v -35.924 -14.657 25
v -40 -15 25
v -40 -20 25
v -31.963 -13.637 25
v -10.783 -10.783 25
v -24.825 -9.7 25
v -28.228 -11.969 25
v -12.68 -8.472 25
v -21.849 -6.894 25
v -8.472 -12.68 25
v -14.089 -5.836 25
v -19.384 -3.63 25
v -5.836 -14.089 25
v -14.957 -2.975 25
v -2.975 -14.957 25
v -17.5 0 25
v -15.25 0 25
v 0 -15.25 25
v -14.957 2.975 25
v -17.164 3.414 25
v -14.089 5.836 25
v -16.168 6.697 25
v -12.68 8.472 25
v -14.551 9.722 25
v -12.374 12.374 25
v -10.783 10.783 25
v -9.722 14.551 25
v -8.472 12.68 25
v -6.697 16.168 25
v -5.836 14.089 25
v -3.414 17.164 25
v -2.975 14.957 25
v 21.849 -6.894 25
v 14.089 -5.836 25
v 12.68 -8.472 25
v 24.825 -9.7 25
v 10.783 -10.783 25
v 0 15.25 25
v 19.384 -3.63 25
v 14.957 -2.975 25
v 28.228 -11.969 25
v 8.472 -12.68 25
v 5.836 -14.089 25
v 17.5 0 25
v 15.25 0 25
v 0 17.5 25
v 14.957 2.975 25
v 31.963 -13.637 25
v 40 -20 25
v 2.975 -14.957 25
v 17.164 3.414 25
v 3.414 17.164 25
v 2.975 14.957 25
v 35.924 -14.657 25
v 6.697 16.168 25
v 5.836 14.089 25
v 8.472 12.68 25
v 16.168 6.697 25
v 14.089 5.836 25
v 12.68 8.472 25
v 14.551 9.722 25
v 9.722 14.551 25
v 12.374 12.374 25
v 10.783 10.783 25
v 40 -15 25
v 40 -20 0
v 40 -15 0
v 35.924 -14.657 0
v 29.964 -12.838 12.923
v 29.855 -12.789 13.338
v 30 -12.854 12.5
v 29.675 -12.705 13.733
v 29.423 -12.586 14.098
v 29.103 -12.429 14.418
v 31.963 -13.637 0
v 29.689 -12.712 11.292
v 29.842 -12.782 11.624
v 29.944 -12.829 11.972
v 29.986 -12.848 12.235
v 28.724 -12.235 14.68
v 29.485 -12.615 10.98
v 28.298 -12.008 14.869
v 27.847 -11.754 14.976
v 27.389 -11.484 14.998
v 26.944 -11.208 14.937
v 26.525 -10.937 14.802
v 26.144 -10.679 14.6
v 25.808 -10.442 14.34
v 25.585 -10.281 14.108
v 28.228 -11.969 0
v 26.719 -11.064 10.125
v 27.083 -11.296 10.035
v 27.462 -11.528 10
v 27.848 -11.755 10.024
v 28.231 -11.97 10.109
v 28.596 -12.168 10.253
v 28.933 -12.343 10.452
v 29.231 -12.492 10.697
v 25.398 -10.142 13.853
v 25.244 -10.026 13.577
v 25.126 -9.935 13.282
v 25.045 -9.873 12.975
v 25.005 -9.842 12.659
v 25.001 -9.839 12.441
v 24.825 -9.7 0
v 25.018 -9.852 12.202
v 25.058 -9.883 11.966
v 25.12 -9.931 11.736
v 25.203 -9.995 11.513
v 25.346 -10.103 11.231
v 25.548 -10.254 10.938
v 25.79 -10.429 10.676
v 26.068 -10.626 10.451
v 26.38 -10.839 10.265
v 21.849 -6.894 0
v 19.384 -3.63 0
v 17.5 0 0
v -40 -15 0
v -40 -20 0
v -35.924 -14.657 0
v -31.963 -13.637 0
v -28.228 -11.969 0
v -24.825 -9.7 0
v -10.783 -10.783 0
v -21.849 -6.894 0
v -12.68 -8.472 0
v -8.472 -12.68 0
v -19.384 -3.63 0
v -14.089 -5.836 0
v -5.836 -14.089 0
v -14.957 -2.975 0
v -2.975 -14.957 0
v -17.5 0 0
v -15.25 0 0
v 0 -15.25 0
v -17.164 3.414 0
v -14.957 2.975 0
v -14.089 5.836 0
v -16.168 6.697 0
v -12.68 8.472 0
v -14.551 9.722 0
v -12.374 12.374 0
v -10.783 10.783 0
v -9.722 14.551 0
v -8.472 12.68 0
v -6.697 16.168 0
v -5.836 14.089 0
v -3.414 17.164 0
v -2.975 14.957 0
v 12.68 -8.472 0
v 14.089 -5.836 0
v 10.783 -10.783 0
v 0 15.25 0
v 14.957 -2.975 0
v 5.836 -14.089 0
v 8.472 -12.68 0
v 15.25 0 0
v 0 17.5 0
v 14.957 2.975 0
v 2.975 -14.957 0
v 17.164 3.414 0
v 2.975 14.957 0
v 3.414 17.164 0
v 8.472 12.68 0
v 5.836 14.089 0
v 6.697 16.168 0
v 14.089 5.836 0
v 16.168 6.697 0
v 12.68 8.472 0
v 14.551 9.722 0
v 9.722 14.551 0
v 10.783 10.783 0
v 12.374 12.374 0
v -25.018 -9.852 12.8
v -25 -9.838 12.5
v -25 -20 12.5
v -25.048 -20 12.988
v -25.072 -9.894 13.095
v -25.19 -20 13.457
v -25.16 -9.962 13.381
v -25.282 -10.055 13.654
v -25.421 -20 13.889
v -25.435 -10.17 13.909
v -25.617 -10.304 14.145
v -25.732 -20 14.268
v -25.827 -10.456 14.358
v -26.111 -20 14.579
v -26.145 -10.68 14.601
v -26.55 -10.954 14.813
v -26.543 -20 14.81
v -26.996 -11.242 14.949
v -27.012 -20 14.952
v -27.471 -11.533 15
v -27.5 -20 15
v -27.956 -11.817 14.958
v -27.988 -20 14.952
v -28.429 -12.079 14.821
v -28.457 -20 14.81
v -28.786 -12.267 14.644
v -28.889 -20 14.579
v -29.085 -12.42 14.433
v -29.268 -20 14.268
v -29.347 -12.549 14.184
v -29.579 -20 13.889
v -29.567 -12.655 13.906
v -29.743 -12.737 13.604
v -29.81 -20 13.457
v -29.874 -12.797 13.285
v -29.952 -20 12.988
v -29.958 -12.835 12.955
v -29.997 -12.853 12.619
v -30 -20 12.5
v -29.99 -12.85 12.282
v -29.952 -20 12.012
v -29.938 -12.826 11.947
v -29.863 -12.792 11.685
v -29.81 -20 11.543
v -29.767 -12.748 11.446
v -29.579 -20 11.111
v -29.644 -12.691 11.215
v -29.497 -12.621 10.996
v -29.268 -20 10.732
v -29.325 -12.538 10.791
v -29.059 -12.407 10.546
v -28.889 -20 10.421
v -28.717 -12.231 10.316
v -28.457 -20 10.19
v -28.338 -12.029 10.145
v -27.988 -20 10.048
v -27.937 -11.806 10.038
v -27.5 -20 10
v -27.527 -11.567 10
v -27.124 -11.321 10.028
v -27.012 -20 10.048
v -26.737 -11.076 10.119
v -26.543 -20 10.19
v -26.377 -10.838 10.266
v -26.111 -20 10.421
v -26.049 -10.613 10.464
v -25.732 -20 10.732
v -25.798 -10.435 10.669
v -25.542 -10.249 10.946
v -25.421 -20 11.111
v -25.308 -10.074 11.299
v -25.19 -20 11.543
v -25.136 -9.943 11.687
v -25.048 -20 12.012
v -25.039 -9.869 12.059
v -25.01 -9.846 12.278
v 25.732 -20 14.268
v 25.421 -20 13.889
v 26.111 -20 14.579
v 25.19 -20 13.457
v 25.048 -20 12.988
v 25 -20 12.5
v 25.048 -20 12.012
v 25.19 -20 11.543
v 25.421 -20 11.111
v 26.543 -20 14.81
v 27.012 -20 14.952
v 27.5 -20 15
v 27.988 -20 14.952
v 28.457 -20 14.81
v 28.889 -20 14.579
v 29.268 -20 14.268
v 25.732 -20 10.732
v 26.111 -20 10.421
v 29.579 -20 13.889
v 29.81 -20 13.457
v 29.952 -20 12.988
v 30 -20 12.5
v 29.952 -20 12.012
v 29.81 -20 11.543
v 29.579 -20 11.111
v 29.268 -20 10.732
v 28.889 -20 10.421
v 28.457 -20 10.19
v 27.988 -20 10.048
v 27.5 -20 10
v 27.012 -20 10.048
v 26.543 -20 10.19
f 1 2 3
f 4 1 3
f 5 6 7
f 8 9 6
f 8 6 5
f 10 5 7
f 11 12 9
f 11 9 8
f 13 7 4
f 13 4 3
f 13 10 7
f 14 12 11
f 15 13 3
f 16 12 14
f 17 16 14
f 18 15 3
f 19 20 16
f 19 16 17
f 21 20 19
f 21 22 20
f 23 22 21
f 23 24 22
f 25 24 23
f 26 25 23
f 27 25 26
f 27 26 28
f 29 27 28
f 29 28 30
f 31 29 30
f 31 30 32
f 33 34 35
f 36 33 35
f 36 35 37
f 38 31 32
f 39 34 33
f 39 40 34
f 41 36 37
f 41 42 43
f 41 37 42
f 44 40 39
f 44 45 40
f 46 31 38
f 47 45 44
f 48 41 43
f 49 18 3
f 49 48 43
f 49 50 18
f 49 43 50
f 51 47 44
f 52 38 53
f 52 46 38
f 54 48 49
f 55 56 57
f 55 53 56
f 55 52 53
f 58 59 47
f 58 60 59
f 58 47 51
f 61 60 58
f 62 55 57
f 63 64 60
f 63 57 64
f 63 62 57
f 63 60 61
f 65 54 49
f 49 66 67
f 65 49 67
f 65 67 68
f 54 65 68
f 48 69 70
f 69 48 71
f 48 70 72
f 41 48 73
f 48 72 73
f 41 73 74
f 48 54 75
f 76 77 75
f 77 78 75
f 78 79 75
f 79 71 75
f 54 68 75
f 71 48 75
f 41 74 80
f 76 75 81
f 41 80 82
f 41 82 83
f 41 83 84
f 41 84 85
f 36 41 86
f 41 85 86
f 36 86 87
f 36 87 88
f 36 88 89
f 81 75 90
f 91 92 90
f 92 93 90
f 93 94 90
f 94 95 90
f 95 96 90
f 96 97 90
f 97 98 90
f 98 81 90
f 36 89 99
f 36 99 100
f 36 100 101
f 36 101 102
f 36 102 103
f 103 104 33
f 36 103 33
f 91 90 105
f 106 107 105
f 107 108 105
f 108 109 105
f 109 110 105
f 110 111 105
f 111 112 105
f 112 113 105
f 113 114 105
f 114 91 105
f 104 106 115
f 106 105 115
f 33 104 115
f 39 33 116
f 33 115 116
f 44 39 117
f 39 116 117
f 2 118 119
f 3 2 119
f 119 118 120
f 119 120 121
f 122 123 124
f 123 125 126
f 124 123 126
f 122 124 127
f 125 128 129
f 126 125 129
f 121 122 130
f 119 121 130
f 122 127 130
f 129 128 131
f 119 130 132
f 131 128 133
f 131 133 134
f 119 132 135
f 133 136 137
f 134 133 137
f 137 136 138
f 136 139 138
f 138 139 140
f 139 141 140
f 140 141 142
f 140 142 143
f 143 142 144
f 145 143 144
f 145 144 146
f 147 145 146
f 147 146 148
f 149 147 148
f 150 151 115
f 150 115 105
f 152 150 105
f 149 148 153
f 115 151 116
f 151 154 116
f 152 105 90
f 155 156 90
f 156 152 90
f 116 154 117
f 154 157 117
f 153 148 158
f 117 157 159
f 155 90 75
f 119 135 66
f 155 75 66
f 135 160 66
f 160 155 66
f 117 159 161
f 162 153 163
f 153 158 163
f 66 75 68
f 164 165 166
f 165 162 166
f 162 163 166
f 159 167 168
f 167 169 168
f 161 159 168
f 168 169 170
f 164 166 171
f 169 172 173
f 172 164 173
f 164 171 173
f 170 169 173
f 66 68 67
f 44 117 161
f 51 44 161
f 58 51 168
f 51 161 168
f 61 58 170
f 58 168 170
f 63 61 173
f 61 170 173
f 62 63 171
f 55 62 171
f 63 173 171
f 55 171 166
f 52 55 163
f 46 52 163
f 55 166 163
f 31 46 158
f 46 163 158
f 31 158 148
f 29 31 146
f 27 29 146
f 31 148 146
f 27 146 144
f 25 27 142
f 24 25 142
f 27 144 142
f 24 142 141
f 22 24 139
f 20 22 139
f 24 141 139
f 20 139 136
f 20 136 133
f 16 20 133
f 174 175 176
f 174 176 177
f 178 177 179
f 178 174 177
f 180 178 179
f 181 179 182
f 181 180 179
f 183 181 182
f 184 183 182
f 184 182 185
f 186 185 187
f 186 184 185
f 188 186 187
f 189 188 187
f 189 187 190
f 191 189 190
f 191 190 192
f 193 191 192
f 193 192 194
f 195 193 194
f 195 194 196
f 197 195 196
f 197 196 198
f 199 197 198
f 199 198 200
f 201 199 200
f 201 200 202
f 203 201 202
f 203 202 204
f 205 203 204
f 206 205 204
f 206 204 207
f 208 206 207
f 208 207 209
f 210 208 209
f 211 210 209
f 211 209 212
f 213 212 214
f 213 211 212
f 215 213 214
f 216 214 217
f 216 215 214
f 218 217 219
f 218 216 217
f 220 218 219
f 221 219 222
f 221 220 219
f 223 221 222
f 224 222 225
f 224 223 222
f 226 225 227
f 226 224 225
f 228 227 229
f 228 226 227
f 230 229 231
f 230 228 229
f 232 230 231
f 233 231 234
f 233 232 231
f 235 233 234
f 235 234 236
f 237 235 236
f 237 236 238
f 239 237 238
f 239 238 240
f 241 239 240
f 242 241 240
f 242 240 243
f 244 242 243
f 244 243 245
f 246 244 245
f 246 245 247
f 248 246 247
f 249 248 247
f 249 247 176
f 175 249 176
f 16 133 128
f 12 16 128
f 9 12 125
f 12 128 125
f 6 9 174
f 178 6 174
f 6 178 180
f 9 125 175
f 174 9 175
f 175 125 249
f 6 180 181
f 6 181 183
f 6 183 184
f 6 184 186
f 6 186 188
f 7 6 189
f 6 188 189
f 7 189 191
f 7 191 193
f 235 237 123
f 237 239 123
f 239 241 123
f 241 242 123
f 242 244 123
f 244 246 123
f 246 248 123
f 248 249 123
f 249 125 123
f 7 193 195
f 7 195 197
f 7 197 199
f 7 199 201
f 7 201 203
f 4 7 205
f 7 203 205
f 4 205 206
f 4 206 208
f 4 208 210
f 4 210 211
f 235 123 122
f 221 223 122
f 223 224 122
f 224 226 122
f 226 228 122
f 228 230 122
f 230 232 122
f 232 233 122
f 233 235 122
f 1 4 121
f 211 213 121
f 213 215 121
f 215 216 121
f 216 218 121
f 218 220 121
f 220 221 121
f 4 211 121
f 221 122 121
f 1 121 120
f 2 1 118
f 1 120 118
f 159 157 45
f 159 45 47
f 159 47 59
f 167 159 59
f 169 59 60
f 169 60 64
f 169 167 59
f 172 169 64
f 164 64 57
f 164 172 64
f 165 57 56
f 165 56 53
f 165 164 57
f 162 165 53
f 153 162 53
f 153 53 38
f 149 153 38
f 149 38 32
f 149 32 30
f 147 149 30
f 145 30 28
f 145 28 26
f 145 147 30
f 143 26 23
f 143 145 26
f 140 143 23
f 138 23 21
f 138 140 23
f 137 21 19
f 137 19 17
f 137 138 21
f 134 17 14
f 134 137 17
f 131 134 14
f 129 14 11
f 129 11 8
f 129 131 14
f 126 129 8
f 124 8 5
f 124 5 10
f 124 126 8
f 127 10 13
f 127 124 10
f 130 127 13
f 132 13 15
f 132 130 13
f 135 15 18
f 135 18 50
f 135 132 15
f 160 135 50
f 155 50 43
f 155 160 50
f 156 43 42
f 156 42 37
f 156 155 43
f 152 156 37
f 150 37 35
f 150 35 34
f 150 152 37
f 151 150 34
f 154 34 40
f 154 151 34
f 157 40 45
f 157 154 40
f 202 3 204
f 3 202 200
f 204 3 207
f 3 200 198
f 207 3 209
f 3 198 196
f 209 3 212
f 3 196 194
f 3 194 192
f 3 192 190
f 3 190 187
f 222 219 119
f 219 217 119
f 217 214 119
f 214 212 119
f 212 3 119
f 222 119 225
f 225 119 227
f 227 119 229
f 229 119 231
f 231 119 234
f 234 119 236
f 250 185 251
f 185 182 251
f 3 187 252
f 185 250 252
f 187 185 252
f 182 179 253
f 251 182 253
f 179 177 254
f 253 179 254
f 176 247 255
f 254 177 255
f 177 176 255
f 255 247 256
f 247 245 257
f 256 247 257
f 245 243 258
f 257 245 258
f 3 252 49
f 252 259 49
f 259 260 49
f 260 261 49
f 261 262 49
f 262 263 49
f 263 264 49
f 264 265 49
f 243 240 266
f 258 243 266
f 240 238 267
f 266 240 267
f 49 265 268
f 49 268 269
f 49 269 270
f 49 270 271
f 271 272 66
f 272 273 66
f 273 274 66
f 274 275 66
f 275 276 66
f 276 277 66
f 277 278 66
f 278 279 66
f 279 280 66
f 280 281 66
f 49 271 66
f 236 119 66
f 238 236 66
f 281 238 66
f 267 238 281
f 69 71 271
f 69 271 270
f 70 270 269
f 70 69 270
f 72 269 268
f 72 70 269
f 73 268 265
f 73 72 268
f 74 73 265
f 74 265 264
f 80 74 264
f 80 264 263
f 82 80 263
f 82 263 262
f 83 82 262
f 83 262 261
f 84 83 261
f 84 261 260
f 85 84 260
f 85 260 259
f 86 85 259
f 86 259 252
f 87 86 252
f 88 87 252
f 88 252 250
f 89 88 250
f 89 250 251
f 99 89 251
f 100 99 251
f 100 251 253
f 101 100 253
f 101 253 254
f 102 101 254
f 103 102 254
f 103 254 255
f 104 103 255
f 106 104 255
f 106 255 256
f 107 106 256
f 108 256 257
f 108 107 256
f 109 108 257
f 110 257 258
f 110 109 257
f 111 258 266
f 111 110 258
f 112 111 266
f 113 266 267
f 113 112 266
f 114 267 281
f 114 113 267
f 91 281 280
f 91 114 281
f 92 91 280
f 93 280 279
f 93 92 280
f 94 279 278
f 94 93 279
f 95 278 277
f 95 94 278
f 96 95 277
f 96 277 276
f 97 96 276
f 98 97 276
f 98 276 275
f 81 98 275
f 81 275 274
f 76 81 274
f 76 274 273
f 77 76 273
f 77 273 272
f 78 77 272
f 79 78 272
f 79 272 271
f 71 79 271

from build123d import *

# Parameters (mm, degrees)
F0_R     = 15.25
F1_DEPTH = 25
F2_R     = 2.5
F3_DEPTH = 25


with BuildPart() as f1:
    # F0 (on Top) → F1 (new body)
    with BuildSketch(Plane.XY):
        with BuildLine():
            ThreePointArc((40, -15), (26.479183, -10.906226), (17.5, 0))
            ThreePointArc((17.5, 0), (0, 17.5), (-17.5, 0))
            ThreePointArc((-17.5, 0), (-26.479183, -10.906226), (-40, -15))
            Line((-40, -15), (-40, -20))
            Line((-40, -20), (40, -20))
            Line((40, -20), (40, -15))
        make_face()
        Circle(F0_R, mode=Mode.SUBTRACT)
    extrude(amount=F1_DEPTH)

    # F2 (on Front) → F3 (cut)
    with BuildSketch(Plane.XZ):
        with Locations((27.5, 12.5)):
            Circle(F2_R)
        with Locations((-27.5, 12.5)):
            Circle(F2_R)
    extrude(amount=F3_DEPTH, mode=Mode.SUBTRACT)


solid = f1.part
